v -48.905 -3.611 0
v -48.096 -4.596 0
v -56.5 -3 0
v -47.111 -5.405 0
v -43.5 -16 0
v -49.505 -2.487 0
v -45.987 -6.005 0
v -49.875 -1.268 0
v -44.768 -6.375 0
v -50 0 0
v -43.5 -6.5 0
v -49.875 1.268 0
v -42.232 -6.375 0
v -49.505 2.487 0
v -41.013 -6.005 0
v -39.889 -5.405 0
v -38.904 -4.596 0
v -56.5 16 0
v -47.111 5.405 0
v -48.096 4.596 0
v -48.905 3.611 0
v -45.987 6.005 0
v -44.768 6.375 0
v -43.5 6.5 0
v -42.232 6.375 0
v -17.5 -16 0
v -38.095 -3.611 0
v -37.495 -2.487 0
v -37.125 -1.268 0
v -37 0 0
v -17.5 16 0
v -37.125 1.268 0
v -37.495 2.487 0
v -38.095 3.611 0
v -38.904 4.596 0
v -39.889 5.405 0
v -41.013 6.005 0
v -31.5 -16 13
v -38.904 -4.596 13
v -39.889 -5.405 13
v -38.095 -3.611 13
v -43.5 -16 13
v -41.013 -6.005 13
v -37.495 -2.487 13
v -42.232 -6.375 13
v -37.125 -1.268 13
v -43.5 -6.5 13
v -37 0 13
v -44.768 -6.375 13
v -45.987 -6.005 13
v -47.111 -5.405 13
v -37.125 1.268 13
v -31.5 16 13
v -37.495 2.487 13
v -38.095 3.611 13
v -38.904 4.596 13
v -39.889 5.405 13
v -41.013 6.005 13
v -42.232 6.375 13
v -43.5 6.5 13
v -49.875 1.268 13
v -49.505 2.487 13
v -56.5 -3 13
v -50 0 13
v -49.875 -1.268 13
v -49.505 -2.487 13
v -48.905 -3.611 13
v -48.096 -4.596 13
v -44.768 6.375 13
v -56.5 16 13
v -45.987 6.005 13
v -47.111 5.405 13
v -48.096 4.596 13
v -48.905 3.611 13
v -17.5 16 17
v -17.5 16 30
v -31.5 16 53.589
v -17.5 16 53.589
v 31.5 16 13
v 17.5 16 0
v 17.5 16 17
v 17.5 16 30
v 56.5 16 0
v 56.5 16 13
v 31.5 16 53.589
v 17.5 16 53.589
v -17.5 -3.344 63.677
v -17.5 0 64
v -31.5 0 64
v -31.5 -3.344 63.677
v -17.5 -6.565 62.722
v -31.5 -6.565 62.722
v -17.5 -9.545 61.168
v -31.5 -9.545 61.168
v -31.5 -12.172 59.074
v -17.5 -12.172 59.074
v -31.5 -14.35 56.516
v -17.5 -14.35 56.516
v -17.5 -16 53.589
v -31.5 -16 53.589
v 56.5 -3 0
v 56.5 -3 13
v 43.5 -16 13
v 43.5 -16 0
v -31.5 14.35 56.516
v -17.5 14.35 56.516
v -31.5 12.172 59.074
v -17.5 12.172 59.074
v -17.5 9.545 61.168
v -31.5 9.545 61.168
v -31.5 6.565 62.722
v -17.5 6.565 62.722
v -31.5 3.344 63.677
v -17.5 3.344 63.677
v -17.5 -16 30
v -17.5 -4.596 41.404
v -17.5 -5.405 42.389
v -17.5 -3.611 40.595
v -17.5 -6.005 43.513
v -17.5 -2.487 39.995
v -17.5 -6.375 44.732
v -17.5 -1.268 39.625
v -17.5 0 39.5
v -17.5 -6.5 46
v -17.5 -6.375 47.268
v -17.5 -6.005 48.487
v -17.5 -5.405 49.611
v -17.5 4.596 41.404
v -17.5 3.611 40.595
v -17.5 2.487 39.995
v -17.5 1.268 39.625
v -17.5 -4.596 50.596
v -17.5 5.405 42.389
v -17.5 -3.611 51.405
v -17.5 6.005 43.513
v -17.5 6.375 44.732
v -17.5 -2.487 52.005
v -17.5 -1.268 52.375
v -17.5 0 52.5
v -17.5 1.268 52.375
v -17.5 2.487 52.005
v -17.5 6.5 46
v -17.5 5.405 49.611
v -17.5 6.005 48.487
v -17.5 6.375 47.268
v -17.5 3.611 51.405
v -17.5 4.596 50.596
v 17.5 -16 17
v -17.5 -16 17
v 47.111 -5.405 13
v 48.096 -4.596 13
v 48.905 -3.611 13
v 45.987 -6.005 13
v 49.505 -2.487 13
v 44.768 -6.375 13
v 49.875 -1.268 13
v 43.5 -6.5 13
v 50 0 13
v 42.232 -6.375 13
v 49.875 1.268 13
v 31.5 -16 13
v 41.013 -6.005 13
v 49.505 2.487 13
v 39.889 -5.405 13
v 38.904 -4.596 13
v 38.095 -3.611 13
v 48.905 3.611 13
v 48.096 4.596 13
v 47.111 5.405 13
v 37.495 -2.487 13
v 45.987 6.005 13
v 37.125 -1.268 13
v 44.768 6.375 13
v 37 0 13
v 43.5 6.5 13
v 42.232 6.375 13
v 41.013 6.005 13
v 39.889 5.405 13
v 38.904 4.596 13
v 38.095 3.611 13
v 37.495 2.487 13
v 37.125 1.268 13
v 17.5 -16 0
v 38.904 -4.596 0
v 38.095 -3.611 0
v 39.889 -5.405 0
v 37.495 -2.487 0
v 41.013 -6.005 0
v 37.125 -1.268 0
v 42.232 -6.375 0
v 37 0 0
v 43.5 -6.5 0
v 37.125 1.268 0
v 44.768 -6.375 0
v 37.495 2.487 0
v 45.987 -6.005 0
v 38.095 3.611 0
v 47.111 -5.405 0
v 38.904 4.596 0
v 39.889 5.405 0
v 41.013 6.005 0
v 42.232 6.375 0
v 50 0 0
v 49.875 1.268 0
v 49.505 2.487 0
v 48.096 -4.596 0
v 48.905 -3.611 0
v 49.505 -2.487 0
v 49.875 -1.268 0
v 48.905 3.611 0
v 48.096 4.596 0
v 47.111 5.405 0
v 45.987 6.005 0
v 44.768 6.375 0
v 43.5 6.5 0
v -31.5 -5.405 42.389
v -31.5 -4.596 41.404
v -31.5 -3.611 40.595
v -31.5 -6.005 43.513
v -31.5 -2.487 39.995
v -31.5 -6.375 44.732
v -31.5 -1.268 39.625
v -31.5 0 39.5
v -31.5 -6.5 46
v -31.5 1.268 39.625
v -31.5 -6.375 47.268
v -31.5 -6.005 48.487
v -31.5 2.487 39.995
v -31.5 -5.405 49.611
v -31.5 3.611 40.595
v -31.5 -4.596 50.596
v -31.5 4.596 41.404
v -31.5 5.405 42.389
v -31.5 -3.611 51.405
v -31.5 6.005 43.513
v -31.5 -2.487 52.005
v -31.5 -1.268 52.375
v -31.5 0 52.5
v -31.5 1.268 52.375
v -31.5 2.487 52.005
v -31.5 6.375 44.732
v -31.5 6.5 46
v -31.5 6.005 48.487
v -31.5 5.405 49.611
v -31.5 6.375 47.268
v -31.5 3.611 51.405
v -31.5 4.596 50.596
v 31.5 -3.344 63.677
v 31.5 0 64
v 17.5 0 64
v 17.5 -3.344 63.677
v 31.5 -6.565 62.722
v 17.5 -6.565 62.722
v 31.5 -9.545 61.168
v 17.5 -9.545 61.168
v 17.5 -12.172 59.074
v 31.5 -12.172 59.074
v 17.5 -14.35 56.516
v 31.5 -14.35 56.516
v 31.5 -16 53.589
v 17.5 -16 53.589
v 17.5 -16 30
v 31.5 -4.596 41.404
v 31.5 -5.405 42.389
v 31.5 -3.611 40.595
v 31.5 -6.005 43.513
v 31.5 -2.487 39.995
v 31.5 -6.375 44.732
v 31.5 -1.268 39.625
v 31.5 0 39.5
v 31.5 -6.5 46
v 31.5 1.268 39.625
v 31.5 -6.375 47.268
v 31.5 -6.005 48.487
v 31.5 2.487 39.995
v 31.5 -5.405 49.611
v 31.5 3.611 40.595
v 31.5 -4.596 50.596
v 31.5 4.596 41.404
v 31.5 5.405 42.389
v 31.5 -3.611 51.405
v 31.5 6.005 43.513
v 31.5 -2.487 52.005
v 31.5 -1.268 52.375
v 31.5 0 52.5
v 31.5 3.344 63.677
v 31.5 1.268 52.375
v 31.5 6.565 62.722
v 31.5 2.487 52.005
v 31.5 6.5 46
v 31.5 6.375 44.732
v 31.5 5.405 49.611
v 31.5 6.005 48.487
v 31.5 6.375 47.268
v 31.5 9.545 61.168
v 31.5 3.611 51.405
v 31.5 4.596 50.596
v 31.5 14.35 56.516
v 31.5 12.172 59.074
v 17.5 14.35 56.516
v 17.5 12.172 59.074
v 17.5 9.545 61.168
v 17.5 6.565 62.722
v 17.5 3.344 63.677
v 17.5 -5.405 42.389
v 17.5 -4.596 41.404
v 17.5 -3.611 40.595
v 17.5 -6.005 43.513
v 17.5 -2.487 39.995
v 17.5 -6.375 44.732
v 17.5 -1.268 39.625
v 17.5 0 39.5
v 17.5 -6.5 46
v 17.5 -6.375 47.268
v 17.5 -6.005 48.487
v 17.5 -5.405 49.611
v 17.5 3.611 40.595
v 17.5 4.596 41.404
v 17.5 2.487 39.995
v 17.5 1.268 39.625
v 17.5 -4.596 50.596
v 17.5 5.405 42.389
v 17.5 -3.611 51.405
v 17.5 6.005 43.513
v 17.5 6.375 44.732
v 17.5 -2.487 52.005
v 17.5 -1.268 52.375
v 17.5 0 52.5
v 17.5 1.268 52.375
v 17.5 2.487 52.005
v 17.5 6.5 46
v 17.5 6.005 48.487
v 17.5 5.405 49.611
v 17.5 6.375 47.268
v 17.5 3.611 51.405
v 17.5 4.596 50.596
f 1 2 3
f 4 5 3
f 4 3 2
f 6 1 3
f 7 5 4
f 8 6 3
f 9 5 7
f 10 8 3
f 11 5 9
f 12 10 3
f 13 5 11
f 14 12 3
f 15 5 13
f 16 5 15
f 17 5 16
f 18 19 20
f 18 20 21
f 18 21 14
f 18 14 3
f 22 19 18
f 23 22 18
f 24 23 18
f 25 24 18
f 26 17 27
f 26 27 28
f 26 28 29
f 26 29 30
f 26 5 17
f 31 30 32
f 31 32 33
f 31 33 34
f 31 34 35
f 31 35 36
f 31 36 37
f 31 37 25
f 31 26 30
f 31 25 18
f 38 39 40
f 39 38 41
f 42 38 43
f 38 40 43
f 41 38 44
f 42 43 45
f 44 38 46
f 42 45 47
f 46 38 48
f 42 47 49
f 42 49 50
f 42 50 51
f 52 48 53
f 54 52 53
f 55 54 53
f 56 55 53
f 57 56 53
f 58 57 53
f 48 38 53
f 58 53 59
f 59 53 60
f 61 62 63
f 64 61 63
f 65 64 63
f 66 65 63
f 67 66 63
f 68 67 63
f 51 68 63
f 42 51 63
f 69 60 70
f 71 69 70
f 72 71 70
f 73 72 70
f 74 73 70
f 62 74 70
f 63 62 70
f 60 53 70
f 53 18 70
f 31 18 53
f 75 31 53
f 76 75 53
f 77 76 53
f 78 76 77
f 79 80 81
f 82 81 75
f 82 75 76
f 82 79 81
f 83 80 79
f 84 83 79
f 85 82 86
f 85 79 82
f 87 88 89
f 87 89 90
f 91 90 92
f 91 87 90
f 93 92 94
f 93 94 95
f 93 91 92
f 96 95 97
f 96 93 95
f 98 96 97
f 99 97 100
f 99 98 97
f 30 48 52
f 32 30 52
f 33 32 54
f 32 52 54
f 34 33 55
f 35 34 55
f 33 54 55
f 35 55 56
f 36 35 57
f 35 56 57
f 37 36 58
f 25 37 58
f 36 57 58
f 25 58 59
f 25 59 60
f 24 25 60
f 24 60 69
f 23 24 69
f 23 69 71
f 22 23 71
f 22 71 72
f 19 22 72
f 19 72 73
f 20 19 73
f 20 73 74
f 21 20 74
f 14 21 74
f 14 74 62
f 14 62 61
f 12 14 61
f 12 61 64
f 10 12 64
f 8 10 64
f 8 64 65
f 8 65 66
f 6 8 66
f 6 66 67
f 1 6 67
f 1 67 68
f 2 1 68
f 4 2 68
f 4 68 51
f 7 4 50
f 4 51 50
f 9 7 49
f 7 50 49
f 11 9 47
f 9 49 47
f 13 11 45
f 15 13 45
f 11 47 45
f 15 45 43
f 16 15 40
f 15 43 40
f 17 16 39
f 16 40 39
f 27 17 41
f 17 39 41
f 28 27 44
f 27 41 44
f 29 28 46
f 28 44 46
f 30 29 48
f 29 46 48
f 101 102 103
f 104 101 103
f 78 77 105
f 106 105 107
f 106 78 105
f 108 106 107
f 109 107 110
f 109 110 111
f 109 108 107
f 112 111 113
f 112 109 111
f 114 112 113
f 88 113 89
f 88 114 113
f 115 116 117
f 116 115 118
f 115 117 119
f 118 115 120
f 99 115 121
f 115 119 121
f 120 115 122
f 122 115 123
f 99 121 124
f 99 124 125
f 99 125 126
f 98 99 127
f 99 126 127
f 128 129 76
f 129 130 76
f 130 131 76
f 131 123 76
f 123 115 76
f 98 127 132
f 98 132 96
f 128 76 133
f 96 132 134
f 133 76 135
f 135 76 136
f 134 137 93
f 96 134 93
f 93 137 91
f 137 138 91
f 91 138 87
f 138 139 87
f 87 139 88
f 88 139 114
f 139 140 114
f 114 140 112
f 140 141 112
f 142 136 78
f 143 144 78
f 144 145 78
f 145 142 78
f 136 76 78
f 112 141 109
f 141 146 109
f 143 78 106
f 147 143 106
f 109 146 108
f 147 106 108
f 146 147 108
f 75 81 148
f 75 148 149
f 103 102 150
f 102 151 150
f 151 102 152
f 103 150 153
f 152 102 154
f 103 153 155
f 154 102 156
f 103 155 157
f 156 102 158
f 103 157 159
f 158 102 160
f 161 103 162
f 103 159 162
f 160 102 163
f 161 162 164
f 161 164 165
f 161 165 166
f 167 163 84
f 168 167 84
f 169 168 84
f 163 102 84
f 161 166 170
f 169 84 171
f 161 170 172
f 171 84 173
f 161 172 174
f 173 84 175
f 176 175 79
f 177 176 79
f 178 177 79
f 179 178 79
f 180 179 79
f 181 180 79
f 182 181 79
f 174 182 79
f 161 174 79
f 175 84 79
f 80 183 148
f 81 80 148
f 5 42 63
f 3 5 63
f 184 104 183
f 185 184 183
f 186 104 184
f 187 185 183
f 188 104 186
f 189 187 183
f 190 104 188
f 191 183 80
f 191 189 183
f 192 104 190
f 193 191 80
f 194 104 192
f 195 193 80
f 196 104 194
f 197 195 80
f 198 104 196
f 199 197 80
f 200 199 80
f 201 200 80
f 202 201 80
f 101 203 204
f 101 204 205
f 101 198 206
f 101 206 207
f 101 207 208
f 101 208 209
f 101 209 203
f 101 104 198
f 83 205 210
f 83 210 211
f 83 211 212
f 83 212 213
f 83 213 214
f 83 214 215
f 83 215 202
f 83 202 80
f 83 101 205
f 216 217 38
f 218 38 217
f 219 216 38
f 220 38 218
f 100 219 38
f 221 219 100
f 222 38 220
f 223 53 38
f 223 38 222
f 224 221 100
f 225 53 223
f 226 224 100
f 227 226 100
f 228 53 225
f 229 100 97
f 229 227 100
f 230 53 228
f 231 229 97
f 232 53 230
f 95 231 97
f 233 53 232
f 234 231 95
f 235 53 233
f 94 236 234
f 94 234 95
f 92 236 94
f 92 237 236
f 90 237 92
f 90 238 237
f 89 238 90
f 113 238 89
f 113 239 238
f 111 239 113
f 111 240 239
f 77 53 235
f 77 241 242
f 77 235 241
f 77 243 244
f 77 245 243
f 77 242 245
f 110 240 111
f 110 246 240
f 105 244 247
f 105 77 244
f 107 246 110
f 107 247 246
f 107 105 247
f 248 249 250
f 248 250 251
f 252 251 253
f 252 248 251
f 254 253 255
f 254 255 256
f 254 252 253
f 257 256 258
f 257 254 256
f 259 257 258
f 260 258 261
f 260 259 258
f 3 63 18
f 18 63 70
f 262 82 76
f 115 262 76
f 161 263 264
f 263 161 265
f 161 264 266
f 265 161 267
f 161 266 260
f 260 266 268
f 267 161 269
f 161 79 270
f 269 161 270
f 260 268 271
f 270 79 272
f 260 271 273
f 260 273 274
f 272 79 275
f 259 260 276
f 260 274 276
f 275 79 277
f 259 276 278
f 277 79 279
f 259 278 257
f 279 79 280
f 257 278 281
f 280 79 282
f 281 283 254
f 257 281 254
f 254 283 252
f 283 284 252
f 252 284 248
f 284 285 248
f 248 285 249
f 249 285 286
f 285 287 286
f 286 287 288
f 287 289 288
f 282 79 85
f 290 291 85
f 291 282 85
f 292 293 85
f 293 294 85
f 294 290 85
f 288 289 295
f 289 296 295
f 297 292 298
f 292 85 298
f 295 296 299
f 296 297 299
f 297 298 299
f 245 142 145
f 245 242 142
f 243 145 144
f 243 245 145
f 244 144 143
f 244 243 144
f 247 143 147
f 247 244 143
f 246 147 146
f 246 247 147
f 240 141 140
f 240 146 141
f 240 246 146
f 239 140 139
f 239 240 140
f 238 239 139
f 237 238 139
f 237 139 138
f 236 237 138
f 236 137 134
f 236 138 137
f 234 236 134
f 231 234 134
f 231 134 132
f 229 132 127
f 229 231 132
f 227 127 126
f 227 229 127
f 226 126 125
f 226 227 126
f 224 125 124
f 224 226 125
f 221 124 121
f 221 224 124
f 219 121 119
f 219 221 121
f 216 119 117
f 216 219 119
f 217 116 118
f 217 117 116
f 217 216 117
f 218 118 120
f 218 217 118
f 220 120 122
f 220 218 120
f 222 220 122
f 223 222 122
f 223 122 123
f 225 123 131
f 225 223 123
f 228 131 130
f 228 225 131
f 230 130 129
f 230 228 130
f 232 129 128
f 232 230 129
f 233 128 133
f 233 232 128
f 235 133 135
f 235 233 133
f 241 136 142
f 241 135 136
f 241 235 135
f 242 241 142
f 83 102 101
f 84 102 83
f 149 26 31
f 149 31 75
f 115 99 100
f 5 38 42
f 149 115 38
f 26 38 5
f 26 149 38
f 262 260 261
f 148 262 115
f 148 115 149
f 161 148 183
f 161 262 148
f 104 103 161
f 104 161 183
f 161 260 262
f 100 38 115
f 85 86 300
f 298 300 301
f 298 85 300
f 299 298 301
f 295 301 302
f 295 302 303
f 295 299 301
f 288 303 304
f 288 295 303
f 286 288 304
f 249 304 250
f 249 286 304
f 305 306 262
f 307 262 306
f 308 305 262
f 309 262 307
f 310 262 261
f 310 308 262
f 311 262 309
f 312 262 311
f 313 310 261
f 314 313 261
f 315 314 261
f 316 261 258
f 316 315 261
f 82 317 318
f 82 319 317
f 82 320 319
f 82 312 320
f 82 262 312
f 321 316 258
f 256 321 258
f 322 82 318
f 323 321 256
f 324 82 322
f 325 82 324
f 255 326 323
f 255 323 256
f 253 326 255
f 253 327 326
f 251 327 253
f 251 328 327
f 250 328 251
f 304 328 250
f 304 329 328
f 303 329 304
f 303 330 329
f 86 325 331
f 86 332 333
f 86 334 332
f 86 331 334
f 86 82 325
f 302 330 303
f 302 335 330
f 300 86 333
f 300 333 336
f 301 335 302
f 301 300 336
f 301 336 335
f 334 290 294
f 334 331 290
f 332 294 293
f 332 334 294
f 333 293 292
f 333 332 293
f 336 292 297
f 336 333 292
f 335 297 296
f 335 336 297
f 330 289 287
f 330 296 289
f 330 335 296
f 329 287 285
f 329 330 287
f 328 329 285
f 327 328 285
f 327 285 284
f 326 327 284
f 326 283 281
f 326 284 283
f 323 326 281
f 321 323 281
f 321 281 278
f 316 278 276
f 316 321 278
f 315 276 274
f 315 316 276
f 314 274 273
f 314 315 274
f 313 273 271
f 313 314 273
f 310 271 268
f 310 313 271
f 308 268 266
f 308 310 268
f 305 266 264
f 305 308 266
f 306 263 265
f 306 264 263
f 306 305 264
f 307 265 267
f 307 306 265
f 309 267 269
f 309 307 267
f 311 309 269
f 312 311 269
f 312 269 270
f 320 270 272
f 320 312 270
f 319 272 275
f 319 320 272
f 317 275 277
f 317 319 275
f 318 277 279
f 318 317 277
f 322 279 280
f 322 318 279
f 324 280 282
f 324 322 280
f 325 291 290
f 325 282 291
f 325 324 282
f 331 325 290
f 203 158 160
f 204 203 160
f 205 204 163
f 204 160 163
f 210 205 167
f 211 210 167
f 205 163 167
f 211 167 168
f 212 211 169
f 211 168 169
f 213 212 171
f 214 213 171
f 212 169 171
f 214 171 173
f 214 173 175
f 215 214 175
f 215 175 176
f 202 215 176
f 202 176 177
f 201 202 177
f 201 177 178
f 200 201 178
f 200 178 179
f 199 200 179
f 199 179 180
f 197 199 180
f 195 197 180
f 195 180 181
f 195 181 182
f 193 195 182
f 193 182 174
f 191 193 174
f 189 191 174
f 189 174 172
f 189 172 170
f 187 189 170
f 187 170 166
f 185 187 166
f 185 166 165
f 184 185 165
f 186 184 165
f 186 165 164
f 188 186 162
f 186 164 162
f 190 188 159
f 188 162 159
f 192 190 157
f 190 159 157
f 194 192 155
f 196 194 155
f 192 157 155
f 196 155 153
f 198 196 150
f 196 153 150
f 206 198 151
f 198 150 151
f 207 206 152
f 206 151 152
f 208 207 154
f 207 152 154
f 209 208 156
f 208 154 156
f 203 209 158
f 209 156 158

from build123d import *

# Parameters (mm, degrees)
F0_R     = 6.5
F1_DEPTH = 56.5
F2_W     = 25
F2_H     = 51
F2_W_2   = 35
F2_H_2   = 17
F2_H_3   = 34
F3_DEPTH = 32.001
F4_R     = 6.5
F5_DEPTH = 13.001
F6_R     = 6.5
F7_DEPTH = 13.001


with BuildPart() as f1:
    # F0 (on Right) → F1 (new body, symmetric)
    with BuildSketch(Plane.YZ):
        with BuildLine():
            Line((-16, 0), (16, 0))
            Line((16, 0), (16, 53.588723))
            ThreePointArc((16, 53.588723), (9.544562, 61.168038), (0, 64))
            ThreePointArc((0, 64), (-9.544562, 61.168038), (-16, 53.588723))
            Line((-16, 53.588723), (-16, 0))
        make_face()
        with Locations((0, 46)):
            Circle(F0_R, mode=Mode.SUBTRACT)
    extrude(amount=F1_DEPTH, both=True)

    # F2 (on face) → F3 (cut, through all)
    with BuildSketch(Plane(origin=(0, 16, 0), x_dir=(-1, 0, 0), z_dir=(0, 1, 0))):
        with Locations((44, 38.5)):
            Rectangle(F2_W, F2_H)
        with Locations((-44, 38.5)):
            Rectangle(F2_W, F2_H)
        with Locations((0, 8.5)):
            Rectangle(F2_W_2, F2_H_2)
        with Locations((0, 47)):
            Rectangle(F2_W_2, F2_H_3)
    extrude(amount=-F3_DEPTH, mode=Mode.SUBTRACT)

    # F4 (on face) → F5 (cut, through all)
    with BuildSketch(Plane.XY.offset(13)):
        with Locations((-43.5, 0)):
            Circle(F4_R)
        Polygon((-56.5, -3), (-56.5, -16), (-43.5, -16), align=None)
    extrude(amount=-F5_DEPTH, mode=Mode.SUBTRACT)

    # F6 (on face) → F7 (cut, through all)
    with BuildSketch(Plane.XY.offset(13)):
        with Locations((43.5, 0)):
            Circle(F6_R)
        Polygon((56.5, -3), (43.5, -16), (56.5, -16), align=None)
    extrude(amount=-F7_DEPTH, mode=Mode.SUBTRACT)


solid = f1.part
